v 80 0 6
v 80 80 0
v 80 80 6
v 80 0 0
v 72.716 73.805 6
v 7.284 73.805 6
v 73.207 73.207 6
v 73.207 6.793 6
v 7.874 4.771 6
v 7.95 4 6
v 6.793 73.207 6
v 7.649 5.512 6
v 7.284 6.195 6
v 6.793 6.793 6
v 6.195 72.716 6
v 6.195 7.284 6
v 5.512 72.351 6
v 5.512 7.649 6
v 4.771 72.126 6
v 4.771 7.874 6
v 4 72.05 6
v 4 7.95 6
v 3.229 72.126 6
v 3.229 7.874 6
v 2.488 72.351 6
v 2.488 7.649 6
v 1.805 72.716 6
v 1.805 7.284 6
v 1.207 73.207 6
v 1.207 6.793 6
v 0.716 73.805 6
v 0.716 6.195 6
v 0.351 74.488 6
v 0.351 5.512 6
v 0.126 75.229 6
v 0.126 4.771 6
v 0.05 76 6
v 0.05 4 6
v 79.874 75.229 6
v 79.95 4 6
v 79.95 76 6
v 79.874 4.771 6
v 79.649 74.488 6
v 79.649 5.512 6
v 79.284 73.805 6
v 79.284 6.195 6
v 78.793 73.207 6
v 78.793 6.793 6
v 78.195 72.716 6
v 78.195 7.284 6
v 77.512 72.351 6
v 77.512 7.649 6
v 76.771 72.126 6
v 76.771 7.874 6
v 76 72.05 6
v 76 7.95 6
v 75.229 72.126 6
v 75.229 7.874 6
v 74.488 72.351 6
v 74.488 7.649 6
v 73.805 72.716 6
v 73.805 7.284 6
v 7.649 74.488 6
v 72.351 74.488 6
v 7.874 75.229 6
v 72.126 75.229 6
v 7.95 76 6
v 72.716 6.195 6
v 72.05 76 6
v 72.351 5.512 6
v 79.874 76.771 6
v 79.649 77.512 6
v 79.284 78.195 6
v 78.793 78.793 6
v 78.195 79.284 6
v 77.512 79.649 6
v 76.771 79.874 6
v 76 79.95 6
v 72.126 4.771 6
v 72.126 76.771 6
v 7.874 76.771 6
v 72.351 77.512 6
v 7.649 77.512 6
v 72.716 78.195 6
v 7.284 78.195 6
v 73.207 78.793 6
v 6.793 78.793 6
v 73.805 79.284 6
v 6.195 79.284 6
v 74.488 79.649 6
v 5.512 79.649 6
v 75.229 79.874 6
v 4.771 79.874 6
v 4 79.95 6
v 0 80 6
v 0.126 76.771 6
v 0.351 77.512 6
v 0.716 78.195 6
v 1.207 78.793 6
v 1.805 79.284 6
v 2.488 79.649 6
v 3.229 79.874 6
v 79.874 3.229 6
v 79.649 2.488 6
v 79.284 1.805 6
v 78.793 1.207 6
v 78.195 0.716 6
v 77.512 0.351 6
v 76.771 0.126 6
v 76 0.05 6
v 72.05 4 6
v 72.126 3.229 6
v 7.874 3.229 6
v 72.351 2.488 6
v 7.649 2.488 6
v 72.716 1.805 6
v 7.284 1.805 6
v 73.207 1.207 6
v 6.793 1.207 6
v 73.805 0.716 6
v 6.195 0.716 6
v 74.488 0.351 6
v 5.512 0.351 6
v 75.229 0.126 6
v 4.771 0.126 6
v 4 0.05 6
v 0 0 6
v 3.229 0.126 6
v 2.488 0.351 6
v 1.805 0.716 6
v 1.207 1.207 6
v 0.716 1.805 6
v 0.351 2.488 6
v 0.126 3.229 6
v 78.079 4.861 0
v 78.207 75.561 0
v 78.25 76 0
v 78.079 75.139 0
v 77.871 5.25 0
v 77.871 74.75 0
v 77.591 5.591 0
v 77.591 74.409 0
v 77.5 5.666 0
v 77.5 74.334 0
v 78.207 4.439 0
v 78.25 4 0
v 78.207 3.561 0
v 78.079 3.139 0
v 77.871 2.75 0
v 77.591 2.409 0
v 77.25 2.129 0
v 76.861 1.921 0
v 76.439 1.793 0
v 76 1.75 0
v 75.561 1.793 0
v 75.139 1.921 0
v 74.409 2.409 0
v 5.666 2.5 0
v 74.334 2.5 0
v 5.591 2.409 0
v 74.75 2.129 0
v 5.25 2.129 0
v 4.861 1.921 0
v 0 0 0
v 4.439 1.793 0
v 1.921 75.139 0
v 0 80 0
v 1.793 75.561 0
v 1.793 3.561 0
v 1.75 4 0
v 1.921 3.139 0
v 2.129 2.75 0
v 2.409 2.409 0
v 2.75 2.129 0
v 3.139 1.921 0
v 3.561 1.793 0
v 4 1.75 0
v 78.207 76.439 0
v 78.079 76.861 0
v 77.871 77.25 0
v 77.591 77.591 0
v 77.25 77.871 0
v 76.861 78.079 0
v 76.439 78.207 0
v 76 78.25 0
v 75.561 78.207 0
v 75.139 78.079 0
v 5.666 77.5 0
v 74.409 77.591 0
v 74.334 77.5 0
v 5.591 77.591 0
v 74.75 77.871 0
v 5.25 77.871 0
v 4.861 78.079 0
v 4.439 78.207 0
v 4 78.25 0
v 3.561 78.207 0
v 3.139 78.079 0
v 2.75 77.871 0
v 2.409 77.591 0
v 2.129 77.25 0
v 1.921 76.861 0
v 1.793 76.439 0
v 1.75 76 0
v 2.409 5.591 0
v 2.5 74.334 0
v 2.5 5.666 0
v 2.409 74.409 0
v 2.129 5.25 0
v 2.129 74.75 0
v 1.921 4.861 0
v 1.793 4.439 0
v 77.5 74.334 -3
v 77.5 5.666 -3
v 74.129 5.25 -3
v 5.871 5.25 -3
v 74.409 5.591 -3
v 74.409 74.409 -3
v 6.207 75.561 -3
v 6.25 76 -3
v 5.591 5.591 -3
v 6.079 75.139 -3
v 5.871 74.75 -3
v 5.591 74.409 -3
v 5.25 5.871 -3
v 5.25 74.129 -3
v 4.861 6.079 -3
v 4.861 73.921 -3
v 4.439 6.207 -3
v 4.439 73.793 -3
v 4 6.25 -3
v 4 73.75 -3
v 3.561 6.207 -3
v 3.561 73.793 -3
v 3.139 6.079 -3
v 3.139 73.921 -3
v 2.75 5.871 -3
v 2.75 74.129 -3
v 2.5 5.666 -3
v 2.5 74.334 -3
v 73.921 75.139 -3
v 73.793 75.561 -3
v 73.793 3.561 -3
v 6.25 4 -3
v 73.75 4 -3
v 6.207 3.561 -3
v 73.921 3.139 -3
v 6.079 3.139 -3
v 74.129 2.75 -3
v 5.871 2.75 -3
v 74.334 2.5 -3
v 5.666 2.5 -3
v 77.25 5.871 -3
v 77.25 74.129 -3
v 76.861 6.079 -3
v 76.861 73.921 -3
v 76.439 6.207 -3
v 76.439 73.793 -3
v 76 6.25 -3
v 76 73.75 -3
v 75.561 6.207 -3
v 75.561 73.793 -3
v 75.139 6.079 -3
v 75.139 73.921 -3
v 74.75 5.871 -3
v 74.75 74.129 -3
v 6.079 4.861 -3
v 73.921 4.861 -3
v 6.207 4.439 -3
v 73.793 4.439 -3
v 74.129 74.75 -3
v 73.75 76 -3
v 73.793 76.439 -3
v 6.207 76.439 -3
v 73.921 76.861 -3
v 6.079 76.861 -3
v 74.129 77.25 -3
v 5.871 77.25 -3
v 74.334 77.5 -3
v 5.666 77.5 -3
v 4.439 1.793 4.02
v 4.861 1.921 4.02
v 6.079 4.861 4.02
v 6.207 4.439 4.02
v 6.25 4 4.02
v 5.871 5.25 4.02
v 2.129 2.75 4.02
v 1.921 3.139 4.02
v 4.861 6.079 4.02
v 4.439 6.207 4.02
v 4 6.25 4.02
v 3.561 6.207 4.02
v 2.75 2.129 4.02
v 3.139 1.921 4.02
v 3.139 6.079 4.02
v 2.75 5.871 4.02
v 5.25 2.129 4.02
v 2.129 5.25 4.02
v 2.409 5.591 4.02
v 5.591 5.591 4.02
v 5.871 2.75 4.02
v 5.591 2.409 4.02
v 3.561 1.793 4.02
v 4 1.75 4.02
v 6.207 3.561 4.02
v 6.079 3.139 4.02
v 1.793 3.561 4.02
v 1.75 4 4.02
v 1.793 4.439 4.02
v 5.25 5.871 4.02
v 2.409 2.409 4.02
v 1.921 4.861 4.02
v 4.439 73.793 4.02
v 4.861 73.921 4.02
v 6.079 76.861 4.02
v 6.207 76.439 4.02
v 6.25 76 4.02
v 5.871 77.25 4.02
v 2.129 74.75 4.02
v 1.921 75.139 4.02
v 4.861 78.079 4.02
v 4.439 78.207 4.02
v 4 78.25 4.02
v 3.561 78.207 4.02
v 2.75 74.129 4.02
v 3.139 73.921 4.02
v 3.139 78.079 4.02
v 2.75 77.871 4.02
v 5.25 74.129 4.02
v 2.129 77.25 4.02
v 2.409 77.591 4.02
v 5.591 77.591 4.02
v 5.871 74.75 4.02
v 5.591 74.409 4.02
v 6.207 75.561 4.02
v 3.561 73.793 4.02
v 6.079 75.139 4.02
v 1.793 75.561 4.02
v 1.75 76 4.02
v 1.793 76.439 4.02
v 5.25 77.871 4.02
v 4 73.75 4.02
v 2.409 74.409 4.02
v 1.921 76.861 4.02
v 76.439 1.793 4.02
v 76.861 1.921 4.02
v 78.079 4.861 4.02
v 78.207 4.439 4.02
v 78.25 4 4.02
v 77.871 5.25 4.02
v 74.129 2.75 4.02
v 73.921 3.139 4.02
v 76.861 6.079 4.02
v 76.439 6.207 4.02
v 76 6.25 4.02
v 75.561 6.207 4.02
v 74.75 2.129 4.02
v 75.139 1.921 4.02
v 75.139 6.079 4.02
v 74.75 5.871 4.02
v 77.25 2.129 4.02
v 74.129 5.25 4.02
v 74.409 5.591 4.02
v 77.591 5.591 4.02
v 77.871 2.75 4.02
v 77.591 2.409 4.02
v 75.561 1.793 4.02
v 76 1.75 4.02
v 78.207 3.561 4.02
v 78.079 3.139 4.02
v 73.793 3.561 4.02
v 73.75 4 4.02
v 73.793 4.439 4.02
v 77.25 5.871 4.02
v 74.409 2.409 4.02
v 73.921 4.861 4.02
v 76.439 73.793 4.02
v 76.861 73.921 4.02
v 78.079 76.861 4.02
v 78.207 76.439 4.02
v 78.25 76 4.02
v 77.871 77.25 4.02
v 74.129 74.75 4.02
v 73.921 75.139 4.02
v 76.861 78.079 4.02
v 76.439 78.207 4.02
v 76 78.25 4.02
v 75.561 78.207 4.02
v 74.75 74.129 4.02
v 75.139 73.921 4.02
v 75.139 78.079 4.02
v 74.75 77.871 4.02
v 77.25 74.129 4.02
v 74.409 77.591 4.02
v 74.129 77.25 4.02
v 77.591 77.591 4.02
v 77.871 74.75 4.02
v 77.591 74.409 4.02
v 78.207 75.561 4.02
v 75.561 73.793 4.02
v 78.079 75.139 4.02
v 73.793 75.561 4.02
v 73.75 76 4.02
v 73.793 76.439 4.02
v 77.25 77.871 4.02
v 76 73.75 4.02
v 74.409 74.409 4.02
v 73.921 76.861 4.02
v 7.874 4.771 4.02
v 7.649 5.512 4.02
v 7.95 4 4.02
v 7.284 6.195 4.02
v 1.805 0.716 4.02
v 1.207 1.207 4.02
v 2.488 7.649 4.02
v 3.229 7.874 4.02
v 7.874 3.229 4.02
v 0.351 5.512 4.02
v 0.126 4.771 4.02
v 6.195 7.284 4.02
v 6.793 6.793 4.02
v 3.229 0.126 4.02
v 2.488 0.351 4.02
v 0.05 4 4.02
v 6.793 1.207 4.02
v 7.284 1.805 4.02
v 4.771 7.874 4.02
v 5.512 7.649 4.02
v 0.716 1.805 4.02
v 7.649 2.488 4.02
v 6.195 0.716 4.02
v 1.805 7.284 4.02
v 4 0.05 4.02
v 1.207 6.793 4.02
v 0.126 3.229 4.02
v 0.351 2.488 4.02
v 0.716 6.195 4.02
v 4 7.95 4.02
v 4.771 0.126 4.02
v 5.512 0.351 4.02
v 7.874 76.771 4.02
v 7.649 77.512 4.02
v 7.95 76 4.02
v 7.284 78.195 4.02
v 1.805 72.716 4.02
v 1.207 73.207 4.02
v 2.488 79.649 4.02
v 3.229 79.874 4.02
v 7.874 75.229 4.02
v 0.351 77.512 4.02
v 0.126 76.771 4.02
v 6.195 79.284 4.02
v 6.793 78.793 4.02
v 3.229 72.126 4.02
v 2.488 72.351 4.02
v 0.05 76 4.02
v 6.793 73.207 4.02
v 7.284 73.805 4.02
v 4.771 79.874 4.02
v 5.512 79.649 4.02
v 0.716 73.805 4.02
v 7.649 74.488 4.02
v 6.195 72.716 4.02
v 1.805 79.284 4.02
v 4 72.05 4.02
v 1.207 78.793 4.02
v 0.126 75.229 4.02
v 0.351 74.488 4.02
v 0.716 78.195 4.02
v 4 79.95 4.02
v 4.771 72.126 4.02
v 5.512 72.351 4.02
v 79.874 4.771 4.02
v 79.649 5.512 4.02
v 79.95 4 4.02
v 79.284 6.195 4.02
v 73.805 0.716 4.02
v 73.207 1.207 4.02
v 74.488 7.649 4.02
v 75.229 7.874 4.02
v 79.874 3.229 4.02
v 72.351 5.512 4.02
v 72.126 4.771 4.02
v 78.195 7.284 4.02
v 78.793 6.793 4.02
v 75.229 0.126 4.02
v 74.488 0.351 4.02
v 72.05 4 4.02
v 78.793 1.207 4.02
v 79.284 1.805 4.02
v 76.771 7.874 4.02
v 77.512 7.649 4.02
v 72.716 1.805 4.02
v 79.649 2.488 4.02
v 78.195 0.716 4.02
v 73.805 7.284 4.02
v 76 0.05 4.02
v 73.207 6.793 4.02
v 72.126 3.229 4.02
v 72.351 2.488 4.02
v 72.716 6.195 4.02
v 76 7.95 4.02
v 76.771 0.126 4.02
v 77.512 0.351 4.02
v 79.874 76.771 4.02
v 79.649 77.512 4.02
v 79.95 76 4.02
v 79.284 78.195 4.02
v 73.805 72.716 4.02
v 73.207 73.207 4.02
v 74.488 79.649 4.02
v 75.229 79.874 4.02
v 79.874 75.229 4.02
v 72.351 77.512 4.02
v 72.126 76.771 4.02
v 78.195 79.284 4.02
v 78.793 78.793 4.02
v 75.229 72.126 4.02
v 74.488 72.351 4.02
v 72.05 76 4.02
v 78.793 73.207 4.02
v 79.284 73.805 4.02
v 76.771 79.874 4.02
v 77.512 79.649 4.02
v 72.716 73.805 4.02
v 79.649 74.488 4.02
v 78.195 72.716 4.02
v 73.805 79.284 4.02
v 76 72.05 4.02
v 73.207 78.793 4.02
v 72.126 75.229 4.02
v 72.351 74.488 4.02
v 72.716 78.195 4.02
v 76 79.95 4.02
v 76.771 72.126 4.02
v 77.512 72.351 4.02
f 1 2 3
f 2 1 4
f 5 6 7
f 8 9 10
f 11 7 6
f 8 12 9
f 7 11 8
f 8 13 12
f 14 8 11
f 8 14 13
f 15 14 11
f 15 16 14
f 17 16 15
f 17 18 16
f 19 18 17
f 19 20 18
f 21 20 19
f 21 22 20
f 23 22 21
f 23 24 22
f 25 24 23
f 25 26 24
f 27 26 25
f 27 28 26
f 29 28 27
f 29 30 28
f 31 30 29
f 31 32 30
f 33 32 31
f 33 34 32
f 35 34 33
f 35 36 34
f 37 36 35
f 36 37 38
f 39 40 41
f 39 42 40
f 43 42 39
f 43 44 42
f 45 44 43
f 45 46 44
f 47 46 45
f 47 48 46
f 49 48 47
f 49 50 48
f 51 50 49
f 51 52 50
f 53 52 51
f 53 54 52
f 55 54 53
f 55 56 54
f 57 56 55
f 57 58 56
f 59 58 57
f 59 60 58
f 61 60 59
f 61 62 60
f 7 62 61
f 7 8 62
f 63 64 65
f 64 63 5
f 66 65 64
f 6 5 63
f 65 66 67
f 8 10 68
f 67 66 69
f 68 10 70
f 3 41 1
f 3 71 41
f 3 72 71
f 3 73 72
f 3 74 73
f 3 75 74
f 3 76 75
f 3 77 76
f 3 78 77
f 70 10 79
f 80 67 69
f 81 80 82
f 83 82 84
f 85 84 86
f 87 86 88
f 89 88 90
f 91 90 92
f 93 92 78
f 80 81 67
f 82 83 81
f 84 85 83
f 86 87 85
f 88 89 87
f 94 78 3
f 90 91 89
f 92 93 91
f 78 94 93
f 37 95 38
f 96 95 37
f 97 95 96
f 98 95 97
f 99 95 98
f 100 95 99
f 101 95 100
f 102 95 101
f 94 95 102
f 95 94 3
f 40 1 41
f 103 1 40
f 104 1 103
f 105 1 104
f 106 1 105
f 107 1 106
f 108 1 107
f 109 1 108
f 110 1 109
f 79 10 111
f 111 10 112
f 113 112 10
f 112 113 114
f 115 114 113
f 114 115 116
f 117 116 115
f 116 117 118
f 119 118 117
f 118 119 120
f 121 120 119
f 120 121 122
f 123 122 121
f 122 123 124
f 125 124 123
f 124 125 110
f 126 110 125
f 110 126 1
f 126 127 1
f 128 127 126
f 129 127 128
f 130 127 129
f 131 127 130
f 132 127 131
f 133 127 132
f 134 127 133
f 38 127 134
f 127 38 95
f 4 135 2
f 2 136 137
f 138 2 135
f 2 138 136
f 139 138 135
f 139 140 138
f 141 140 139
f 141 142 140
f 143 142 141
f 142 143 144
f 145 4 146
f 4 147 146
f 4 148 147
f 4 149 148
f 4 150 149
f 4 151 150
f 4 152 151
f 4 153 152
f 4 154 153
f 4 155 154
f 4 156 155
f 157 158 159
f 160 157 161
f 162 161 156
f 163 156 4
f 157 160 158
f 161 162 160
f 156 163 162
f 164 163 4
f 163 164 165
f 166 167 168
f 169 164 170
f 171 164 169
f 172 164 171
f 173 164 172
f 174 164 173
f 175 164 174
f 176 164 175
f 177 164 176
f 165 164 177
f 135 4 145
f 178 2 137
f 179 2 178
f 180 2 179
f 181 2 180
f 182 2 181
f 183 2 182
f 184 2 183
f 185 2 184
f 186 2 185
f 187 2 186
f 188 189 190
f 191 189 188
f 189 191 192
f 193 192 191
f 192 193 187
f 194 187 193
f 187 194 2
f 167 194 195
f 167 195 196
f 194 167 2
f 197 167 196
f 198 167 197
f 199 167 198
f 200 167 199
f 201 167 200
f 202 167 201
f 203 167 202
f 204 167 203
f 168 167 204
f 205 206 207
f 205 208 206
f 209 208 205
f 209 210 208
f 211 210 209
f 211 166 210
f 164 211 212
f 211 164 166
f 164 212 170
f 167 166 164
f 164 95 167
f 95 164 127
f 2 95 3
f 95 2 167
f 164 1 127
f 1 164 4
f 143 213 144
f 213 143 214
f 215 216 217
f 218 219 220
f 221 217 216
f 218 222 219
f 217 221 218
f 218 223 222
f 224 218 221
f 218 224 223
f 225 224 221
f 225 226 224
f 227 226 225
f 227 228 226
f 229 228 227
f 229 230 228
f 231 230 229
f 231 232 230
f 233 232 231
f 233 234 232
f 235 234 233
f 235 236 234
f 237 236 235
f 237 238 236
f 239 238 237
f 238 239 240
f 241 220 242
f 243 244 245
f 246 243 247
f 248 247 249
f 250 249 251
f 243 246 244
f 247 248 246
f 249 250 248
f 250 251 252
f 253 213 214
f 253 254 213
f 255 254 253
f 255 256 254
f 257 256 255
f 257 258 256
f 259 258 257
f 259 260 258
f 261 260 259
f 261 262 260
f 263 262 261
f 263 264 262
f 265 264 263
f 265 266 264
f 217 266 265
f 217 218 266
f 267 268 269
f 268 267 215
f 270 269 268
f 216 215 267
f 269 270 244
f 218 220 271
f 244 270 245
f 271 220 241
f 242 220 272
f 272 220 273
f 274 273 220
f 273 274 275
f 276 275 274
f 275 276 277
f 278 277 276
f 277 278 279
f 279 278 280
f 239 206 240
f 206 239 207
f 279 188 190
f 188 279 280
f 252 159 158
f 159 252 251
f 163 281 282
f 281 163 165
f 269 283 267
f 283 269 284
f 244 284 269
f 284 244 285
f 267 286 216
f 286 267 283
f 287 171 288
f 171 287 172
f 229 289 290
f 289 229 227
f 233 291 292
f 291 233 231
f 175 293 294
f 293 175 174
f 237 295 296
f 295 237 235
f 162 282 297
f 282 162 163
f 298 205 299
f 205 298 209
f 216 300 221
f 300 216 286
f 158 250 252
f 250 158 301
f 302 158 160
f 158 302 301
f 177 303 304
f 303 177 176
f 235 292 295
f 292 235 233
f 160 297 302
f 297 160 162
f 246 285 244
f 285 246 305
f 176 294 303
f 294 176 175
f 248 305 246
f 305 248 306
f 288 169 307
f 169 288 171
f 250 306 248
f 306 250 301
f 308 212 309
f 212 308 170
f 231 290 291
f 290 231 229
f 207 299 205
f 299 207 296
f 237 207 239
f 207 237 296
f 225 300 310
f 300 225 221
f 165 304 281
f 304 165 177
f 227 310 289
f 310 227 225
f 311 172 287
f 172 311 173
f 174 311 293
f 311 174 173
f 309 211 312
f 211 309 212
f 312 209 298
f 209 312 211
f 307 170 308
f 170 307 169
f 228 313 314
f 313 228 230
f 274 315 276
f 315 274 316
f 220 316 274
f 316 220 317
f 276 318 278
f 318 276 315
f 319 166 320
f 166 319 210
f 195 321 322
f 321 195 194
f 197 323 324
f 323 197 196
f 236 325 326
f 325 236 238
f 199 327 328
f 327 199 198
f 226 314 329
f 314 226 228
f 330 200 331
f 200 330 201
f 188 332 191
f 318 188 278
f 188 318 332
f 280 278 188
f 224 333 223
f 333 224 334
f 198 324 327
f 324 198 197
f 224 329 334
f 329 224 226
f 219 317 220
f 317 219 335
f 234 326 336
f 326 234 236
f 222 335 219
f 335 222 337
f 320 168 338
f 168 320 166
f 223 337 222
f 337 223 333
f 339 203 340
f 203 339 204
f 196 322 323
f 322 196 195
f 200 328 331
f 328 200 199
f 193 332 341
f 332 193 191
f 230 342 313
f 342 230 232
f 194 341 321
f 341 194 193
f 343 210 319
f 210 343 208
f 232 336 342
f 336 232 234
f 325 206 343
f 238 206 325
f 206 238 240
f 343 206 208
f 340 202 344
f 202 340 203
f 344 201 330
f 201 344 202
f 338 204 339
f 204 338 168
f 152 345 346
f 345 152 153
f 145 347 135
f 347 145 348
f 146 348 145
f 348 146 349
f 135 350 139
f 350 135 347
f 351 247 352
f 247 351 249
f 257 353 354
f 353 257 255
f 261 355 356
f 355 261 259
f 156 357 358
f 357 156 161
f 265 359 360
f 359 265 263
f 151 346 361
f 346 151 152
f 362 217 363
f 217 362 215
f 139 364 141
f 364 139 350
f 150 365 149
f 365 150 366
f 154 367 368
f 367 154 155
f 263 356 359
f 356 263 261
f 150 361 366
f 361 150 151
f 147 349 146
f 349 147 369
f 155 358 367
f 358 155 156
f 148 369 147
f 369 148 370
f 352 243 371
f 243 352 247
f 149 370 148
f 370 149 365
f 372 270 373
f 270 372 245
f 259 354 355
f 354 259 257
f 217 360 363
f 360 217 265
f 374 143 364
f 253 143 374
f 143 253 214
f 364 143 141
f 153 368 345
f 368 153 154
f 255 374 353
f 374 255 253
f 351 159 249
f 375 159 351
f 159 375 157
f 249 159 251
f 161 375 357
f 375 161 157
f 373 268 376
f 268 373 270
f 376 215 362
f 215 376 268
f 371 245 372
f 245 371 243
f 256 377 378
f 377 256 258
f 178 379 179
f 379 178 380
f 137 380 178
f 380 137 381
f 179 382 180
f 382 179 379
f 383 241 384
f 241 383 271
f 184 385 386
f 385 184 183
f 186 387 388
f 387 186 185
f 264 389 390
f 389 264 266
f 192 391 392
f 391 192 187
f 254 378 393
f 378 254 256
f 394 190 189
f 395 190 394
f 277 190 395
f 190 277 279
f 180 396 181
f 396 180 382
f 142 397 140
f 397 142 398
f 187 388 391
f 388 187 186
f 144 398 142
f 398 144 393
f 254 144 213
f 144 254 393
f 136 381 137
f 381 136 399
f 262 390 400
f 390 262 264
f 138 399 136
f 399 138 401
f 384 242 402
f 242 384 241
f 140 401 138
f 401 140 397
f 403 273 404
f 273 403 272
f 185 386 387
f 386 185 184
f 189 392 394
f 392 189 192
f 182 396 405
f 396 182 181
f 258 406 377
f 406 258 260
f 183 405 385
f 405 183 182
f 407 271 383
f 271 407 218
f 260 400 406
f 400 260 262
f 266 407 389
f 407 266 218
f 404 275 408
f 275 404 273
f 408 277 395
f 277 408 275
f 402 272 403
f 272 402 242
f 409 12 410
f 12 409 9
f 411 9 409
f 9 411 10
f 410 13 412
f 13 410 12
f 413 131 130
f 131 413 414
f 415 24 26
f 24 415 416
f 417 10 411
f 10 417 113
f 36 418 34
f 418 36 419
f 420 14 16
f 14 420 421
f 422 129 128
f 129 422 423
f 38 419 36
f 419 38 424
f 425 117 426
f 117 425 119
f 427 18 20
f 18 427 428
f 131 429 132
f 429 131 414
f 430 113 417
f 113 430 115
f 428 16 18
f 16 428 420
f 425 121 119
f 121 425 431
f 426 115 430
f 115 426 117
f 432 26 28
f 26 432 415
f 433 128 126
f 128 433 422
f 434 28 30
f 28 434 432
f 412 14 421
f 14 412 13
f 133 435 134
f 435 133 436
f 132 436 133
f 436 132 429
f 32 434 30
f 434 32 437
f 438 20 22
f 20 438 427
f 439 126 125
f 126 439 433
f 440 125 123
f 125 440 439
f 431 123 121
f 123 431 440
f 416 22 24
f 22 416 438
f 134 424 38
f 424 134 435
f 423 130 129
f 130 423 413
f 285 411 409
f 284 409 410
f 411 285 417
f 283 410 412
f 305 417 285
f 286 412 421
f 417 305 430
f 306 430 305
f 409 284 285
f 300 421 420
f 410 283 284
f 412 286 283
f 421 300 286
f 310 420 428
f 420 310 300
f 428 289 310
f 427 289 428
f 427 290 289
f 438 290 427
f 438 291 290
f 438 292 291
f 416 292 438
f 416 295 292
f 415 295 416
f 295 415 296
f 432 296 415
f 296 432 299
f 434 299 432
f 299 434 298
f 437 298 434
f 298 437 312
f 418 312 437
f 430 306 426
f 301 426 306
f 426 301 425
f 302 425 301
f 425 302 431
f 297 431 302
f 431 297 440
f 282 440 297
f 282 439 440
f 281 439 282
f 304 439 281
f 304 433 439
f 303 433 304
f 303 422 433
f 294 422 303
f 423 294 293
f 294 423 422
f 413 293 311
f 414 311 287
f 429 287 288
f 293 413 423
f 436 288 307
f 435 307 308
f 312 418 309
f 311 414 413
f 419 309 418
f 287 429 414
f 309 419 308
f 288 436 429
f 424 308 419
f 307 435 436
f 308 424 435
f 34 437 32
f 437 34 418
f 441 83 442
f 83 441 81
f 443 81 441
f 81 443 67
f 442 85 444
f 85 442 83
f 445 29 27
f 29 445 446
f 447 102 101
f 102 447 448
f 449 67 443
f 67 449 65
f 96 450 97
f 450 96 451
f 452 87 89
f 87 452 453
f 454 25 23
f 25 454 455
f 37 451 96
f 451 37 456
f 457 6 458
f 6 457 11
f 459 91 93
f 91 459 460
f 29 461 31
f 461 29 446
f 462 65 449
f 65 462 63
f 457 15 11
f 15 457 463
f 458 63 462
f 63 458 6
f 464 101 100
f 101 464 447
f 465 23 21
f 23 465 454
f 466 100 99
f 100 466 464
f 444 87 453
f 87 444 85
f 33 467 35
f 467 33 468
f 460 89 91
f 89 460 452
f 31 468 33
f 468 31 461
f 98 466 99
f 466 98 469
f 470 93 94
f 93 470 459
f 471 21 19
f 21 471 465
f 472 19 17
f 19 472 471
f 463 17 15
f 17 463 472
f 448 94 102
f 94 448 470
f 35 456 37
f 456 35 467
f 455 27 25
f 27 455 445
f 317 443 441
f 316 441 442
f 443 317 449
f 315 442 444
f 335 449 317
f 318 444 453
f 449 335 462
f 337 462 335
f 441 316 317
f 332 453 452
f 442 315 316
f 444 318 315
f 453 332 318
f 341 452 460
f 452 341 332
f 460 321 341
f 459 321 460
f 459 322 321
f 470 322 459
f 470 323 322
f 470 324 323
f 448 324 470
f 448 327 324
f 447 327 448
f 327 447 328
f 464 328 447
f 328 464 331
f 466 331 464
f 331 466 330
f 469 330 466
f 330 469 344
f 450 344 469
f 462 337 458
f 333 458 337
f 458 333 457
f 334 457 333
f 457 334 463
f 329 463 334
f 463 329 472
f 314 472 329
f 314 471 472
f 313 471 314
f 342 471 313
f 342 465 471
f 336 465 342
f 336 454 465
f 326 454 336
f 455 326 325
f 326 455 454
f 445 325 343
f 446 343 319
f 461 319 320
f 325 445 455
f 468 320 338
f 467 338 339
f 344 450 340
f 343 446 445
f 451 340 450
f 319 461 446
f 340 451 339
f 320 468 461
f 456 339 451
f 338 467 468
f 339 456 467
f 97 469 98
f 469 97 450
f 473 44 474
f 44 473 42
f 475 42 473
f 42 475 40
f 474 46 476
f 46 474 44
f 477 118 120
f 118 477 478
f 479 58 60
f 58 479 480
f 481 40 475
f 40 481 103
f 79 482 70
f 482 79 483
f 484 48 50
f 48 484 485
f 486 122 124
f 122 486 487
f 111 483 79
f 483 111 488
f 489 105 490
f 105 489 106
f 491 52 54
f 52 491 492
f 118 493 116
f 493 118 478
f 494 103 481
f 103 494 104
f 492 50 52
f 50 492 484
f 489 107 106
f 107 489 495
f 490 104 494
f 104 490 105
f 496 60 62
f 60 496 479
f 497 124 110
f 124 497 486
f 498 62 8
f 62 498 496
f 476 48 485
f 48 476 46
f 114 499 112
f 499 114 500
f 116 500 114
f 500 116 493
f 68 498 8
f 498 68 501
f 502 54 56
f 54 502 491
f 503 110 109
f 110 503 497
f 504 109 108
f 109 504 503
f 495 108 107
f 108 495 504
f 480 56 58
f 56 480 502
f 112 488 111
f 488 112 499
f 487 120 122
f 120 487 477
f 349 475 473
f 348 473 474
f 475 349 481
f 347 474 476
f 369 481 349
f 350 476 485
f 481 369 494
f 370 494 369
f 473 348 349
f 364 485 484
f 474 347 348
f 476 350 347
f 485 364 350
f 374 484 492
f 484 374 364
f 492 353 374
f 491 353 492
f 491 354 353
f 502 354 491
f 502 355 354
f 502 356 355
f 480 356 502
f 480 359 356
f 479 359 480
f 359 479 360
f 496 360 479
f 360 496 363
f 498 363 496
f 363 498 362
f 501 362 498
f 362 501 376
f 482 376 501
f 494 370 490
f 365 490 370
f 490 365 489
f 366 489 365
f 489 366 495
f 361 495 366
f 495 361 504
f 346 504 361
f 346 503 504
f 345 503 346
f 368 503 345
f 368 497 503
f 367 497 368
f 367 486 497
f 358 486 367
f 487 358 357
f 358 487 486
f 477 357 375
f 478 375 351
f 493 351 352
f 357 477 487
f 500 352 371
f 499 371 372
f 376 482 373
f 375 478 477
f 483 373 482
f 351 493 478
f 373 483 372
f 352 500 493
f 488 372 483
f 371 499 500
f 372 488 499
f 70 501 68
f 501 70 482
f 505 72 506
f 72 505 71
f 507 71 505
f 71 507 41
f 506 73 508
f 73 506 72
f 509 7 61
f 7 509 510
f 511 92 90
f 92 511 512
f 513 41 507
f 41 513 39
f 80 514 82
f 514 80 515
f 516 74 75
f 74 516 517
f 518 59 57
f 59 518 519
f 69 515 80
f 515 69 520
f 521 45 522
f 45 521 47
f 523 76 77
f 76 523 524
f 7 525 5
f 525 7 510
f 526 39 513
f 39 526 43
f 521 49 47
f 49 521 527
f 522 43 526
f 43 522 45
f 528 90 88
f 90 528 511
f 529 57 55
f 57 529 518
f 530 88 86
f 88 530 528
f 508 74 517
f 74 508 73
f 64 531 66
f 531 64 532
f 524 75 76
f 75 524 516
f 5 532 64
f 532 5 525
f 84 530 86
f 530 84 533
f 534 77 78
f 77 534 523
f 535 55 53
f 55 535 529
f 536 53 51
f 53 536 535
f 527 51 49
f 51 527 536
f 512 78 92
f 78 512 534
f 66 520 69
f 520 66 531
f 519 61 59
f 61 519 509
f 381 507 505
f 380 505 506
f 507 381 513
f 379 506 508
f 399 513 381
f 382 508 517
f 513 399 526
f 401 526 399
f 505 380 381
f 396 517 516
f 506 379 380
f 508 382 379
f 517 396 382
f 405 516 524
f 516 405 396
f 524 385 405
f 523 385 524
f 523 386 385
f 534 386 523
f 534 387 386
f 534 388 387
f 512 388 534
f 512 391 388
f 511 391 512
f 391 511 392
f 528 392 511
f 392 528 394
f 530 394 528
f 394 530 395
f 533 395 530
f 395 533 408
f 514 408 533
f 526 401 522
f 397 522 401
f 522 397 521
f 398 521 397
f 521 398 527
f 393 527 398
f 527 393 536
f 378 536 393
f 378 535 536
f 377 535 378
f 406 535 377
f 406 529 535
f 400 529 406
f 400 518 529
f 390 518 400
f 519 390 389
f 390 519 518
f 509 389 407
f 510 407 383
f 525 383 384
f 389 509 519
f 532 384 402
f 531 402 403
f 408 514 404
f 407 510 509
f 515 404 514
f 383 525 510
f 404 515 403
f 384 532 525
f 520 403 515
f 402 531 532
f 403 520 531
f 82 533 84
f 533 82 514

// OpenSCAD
$fn = 32;

// ----------------------------------------------------------------------
// Enclosure lid: 80 x 80 x 6 mm, 4 bolt holes
// ----------------------------------------------------------------------

// --- parameters (mm) ---
length = 80;              // lid length, X
width = 80;               // lid width, Y
plate_t = 6;              // lid plate thickness
bolt_d = 4.5;             // bolt clearance
boss_lip = 4;             // bolt hole inset from the corner
sink = 1;                 // overlap of the lip and ribs into the plate
lip_h = 4;                // lip height below the plate
lip_wall = 2.5;           // lip wall thickness
cs_d = 7.9;               // countersink diameter
cs_h = 1.98;              // countersink depth

module plate() {
  cube([length, width, plate_t]);
  /* lip that drops into the housing opening, sunk into the plate */
  translate([lip_wall, lip_wall, -lip_h + sink]) cube([length - 2 * lip_wall, width - 2 * lip_wall, lip_h]);
}

difference() {
  plate();
  /* bolt pattern matching the corner bosses */
  for (sx = [0, 1]) for (sy = [0, 1])
    translate([sx * (length - 2 * boss_lip) + boss_lip, sy * (width - 2 * boss_lip) + boss_lip, -lip_h - 1])
      cylinder(h = plate_t + lip_h + 2, d = bolt_d);
  /* countersinks so the heads sit flush */
  for (sx = [0, 1]) for (sy = [0, 1])
    translate([sx * (length - 2 * boss_lip) + boss_lip, sy * (width - 2 * boss_lip) + boss_lip, plate_t - cs_h])
      cylinder(h = cs_h + 0.5, d = cs_d);
}
